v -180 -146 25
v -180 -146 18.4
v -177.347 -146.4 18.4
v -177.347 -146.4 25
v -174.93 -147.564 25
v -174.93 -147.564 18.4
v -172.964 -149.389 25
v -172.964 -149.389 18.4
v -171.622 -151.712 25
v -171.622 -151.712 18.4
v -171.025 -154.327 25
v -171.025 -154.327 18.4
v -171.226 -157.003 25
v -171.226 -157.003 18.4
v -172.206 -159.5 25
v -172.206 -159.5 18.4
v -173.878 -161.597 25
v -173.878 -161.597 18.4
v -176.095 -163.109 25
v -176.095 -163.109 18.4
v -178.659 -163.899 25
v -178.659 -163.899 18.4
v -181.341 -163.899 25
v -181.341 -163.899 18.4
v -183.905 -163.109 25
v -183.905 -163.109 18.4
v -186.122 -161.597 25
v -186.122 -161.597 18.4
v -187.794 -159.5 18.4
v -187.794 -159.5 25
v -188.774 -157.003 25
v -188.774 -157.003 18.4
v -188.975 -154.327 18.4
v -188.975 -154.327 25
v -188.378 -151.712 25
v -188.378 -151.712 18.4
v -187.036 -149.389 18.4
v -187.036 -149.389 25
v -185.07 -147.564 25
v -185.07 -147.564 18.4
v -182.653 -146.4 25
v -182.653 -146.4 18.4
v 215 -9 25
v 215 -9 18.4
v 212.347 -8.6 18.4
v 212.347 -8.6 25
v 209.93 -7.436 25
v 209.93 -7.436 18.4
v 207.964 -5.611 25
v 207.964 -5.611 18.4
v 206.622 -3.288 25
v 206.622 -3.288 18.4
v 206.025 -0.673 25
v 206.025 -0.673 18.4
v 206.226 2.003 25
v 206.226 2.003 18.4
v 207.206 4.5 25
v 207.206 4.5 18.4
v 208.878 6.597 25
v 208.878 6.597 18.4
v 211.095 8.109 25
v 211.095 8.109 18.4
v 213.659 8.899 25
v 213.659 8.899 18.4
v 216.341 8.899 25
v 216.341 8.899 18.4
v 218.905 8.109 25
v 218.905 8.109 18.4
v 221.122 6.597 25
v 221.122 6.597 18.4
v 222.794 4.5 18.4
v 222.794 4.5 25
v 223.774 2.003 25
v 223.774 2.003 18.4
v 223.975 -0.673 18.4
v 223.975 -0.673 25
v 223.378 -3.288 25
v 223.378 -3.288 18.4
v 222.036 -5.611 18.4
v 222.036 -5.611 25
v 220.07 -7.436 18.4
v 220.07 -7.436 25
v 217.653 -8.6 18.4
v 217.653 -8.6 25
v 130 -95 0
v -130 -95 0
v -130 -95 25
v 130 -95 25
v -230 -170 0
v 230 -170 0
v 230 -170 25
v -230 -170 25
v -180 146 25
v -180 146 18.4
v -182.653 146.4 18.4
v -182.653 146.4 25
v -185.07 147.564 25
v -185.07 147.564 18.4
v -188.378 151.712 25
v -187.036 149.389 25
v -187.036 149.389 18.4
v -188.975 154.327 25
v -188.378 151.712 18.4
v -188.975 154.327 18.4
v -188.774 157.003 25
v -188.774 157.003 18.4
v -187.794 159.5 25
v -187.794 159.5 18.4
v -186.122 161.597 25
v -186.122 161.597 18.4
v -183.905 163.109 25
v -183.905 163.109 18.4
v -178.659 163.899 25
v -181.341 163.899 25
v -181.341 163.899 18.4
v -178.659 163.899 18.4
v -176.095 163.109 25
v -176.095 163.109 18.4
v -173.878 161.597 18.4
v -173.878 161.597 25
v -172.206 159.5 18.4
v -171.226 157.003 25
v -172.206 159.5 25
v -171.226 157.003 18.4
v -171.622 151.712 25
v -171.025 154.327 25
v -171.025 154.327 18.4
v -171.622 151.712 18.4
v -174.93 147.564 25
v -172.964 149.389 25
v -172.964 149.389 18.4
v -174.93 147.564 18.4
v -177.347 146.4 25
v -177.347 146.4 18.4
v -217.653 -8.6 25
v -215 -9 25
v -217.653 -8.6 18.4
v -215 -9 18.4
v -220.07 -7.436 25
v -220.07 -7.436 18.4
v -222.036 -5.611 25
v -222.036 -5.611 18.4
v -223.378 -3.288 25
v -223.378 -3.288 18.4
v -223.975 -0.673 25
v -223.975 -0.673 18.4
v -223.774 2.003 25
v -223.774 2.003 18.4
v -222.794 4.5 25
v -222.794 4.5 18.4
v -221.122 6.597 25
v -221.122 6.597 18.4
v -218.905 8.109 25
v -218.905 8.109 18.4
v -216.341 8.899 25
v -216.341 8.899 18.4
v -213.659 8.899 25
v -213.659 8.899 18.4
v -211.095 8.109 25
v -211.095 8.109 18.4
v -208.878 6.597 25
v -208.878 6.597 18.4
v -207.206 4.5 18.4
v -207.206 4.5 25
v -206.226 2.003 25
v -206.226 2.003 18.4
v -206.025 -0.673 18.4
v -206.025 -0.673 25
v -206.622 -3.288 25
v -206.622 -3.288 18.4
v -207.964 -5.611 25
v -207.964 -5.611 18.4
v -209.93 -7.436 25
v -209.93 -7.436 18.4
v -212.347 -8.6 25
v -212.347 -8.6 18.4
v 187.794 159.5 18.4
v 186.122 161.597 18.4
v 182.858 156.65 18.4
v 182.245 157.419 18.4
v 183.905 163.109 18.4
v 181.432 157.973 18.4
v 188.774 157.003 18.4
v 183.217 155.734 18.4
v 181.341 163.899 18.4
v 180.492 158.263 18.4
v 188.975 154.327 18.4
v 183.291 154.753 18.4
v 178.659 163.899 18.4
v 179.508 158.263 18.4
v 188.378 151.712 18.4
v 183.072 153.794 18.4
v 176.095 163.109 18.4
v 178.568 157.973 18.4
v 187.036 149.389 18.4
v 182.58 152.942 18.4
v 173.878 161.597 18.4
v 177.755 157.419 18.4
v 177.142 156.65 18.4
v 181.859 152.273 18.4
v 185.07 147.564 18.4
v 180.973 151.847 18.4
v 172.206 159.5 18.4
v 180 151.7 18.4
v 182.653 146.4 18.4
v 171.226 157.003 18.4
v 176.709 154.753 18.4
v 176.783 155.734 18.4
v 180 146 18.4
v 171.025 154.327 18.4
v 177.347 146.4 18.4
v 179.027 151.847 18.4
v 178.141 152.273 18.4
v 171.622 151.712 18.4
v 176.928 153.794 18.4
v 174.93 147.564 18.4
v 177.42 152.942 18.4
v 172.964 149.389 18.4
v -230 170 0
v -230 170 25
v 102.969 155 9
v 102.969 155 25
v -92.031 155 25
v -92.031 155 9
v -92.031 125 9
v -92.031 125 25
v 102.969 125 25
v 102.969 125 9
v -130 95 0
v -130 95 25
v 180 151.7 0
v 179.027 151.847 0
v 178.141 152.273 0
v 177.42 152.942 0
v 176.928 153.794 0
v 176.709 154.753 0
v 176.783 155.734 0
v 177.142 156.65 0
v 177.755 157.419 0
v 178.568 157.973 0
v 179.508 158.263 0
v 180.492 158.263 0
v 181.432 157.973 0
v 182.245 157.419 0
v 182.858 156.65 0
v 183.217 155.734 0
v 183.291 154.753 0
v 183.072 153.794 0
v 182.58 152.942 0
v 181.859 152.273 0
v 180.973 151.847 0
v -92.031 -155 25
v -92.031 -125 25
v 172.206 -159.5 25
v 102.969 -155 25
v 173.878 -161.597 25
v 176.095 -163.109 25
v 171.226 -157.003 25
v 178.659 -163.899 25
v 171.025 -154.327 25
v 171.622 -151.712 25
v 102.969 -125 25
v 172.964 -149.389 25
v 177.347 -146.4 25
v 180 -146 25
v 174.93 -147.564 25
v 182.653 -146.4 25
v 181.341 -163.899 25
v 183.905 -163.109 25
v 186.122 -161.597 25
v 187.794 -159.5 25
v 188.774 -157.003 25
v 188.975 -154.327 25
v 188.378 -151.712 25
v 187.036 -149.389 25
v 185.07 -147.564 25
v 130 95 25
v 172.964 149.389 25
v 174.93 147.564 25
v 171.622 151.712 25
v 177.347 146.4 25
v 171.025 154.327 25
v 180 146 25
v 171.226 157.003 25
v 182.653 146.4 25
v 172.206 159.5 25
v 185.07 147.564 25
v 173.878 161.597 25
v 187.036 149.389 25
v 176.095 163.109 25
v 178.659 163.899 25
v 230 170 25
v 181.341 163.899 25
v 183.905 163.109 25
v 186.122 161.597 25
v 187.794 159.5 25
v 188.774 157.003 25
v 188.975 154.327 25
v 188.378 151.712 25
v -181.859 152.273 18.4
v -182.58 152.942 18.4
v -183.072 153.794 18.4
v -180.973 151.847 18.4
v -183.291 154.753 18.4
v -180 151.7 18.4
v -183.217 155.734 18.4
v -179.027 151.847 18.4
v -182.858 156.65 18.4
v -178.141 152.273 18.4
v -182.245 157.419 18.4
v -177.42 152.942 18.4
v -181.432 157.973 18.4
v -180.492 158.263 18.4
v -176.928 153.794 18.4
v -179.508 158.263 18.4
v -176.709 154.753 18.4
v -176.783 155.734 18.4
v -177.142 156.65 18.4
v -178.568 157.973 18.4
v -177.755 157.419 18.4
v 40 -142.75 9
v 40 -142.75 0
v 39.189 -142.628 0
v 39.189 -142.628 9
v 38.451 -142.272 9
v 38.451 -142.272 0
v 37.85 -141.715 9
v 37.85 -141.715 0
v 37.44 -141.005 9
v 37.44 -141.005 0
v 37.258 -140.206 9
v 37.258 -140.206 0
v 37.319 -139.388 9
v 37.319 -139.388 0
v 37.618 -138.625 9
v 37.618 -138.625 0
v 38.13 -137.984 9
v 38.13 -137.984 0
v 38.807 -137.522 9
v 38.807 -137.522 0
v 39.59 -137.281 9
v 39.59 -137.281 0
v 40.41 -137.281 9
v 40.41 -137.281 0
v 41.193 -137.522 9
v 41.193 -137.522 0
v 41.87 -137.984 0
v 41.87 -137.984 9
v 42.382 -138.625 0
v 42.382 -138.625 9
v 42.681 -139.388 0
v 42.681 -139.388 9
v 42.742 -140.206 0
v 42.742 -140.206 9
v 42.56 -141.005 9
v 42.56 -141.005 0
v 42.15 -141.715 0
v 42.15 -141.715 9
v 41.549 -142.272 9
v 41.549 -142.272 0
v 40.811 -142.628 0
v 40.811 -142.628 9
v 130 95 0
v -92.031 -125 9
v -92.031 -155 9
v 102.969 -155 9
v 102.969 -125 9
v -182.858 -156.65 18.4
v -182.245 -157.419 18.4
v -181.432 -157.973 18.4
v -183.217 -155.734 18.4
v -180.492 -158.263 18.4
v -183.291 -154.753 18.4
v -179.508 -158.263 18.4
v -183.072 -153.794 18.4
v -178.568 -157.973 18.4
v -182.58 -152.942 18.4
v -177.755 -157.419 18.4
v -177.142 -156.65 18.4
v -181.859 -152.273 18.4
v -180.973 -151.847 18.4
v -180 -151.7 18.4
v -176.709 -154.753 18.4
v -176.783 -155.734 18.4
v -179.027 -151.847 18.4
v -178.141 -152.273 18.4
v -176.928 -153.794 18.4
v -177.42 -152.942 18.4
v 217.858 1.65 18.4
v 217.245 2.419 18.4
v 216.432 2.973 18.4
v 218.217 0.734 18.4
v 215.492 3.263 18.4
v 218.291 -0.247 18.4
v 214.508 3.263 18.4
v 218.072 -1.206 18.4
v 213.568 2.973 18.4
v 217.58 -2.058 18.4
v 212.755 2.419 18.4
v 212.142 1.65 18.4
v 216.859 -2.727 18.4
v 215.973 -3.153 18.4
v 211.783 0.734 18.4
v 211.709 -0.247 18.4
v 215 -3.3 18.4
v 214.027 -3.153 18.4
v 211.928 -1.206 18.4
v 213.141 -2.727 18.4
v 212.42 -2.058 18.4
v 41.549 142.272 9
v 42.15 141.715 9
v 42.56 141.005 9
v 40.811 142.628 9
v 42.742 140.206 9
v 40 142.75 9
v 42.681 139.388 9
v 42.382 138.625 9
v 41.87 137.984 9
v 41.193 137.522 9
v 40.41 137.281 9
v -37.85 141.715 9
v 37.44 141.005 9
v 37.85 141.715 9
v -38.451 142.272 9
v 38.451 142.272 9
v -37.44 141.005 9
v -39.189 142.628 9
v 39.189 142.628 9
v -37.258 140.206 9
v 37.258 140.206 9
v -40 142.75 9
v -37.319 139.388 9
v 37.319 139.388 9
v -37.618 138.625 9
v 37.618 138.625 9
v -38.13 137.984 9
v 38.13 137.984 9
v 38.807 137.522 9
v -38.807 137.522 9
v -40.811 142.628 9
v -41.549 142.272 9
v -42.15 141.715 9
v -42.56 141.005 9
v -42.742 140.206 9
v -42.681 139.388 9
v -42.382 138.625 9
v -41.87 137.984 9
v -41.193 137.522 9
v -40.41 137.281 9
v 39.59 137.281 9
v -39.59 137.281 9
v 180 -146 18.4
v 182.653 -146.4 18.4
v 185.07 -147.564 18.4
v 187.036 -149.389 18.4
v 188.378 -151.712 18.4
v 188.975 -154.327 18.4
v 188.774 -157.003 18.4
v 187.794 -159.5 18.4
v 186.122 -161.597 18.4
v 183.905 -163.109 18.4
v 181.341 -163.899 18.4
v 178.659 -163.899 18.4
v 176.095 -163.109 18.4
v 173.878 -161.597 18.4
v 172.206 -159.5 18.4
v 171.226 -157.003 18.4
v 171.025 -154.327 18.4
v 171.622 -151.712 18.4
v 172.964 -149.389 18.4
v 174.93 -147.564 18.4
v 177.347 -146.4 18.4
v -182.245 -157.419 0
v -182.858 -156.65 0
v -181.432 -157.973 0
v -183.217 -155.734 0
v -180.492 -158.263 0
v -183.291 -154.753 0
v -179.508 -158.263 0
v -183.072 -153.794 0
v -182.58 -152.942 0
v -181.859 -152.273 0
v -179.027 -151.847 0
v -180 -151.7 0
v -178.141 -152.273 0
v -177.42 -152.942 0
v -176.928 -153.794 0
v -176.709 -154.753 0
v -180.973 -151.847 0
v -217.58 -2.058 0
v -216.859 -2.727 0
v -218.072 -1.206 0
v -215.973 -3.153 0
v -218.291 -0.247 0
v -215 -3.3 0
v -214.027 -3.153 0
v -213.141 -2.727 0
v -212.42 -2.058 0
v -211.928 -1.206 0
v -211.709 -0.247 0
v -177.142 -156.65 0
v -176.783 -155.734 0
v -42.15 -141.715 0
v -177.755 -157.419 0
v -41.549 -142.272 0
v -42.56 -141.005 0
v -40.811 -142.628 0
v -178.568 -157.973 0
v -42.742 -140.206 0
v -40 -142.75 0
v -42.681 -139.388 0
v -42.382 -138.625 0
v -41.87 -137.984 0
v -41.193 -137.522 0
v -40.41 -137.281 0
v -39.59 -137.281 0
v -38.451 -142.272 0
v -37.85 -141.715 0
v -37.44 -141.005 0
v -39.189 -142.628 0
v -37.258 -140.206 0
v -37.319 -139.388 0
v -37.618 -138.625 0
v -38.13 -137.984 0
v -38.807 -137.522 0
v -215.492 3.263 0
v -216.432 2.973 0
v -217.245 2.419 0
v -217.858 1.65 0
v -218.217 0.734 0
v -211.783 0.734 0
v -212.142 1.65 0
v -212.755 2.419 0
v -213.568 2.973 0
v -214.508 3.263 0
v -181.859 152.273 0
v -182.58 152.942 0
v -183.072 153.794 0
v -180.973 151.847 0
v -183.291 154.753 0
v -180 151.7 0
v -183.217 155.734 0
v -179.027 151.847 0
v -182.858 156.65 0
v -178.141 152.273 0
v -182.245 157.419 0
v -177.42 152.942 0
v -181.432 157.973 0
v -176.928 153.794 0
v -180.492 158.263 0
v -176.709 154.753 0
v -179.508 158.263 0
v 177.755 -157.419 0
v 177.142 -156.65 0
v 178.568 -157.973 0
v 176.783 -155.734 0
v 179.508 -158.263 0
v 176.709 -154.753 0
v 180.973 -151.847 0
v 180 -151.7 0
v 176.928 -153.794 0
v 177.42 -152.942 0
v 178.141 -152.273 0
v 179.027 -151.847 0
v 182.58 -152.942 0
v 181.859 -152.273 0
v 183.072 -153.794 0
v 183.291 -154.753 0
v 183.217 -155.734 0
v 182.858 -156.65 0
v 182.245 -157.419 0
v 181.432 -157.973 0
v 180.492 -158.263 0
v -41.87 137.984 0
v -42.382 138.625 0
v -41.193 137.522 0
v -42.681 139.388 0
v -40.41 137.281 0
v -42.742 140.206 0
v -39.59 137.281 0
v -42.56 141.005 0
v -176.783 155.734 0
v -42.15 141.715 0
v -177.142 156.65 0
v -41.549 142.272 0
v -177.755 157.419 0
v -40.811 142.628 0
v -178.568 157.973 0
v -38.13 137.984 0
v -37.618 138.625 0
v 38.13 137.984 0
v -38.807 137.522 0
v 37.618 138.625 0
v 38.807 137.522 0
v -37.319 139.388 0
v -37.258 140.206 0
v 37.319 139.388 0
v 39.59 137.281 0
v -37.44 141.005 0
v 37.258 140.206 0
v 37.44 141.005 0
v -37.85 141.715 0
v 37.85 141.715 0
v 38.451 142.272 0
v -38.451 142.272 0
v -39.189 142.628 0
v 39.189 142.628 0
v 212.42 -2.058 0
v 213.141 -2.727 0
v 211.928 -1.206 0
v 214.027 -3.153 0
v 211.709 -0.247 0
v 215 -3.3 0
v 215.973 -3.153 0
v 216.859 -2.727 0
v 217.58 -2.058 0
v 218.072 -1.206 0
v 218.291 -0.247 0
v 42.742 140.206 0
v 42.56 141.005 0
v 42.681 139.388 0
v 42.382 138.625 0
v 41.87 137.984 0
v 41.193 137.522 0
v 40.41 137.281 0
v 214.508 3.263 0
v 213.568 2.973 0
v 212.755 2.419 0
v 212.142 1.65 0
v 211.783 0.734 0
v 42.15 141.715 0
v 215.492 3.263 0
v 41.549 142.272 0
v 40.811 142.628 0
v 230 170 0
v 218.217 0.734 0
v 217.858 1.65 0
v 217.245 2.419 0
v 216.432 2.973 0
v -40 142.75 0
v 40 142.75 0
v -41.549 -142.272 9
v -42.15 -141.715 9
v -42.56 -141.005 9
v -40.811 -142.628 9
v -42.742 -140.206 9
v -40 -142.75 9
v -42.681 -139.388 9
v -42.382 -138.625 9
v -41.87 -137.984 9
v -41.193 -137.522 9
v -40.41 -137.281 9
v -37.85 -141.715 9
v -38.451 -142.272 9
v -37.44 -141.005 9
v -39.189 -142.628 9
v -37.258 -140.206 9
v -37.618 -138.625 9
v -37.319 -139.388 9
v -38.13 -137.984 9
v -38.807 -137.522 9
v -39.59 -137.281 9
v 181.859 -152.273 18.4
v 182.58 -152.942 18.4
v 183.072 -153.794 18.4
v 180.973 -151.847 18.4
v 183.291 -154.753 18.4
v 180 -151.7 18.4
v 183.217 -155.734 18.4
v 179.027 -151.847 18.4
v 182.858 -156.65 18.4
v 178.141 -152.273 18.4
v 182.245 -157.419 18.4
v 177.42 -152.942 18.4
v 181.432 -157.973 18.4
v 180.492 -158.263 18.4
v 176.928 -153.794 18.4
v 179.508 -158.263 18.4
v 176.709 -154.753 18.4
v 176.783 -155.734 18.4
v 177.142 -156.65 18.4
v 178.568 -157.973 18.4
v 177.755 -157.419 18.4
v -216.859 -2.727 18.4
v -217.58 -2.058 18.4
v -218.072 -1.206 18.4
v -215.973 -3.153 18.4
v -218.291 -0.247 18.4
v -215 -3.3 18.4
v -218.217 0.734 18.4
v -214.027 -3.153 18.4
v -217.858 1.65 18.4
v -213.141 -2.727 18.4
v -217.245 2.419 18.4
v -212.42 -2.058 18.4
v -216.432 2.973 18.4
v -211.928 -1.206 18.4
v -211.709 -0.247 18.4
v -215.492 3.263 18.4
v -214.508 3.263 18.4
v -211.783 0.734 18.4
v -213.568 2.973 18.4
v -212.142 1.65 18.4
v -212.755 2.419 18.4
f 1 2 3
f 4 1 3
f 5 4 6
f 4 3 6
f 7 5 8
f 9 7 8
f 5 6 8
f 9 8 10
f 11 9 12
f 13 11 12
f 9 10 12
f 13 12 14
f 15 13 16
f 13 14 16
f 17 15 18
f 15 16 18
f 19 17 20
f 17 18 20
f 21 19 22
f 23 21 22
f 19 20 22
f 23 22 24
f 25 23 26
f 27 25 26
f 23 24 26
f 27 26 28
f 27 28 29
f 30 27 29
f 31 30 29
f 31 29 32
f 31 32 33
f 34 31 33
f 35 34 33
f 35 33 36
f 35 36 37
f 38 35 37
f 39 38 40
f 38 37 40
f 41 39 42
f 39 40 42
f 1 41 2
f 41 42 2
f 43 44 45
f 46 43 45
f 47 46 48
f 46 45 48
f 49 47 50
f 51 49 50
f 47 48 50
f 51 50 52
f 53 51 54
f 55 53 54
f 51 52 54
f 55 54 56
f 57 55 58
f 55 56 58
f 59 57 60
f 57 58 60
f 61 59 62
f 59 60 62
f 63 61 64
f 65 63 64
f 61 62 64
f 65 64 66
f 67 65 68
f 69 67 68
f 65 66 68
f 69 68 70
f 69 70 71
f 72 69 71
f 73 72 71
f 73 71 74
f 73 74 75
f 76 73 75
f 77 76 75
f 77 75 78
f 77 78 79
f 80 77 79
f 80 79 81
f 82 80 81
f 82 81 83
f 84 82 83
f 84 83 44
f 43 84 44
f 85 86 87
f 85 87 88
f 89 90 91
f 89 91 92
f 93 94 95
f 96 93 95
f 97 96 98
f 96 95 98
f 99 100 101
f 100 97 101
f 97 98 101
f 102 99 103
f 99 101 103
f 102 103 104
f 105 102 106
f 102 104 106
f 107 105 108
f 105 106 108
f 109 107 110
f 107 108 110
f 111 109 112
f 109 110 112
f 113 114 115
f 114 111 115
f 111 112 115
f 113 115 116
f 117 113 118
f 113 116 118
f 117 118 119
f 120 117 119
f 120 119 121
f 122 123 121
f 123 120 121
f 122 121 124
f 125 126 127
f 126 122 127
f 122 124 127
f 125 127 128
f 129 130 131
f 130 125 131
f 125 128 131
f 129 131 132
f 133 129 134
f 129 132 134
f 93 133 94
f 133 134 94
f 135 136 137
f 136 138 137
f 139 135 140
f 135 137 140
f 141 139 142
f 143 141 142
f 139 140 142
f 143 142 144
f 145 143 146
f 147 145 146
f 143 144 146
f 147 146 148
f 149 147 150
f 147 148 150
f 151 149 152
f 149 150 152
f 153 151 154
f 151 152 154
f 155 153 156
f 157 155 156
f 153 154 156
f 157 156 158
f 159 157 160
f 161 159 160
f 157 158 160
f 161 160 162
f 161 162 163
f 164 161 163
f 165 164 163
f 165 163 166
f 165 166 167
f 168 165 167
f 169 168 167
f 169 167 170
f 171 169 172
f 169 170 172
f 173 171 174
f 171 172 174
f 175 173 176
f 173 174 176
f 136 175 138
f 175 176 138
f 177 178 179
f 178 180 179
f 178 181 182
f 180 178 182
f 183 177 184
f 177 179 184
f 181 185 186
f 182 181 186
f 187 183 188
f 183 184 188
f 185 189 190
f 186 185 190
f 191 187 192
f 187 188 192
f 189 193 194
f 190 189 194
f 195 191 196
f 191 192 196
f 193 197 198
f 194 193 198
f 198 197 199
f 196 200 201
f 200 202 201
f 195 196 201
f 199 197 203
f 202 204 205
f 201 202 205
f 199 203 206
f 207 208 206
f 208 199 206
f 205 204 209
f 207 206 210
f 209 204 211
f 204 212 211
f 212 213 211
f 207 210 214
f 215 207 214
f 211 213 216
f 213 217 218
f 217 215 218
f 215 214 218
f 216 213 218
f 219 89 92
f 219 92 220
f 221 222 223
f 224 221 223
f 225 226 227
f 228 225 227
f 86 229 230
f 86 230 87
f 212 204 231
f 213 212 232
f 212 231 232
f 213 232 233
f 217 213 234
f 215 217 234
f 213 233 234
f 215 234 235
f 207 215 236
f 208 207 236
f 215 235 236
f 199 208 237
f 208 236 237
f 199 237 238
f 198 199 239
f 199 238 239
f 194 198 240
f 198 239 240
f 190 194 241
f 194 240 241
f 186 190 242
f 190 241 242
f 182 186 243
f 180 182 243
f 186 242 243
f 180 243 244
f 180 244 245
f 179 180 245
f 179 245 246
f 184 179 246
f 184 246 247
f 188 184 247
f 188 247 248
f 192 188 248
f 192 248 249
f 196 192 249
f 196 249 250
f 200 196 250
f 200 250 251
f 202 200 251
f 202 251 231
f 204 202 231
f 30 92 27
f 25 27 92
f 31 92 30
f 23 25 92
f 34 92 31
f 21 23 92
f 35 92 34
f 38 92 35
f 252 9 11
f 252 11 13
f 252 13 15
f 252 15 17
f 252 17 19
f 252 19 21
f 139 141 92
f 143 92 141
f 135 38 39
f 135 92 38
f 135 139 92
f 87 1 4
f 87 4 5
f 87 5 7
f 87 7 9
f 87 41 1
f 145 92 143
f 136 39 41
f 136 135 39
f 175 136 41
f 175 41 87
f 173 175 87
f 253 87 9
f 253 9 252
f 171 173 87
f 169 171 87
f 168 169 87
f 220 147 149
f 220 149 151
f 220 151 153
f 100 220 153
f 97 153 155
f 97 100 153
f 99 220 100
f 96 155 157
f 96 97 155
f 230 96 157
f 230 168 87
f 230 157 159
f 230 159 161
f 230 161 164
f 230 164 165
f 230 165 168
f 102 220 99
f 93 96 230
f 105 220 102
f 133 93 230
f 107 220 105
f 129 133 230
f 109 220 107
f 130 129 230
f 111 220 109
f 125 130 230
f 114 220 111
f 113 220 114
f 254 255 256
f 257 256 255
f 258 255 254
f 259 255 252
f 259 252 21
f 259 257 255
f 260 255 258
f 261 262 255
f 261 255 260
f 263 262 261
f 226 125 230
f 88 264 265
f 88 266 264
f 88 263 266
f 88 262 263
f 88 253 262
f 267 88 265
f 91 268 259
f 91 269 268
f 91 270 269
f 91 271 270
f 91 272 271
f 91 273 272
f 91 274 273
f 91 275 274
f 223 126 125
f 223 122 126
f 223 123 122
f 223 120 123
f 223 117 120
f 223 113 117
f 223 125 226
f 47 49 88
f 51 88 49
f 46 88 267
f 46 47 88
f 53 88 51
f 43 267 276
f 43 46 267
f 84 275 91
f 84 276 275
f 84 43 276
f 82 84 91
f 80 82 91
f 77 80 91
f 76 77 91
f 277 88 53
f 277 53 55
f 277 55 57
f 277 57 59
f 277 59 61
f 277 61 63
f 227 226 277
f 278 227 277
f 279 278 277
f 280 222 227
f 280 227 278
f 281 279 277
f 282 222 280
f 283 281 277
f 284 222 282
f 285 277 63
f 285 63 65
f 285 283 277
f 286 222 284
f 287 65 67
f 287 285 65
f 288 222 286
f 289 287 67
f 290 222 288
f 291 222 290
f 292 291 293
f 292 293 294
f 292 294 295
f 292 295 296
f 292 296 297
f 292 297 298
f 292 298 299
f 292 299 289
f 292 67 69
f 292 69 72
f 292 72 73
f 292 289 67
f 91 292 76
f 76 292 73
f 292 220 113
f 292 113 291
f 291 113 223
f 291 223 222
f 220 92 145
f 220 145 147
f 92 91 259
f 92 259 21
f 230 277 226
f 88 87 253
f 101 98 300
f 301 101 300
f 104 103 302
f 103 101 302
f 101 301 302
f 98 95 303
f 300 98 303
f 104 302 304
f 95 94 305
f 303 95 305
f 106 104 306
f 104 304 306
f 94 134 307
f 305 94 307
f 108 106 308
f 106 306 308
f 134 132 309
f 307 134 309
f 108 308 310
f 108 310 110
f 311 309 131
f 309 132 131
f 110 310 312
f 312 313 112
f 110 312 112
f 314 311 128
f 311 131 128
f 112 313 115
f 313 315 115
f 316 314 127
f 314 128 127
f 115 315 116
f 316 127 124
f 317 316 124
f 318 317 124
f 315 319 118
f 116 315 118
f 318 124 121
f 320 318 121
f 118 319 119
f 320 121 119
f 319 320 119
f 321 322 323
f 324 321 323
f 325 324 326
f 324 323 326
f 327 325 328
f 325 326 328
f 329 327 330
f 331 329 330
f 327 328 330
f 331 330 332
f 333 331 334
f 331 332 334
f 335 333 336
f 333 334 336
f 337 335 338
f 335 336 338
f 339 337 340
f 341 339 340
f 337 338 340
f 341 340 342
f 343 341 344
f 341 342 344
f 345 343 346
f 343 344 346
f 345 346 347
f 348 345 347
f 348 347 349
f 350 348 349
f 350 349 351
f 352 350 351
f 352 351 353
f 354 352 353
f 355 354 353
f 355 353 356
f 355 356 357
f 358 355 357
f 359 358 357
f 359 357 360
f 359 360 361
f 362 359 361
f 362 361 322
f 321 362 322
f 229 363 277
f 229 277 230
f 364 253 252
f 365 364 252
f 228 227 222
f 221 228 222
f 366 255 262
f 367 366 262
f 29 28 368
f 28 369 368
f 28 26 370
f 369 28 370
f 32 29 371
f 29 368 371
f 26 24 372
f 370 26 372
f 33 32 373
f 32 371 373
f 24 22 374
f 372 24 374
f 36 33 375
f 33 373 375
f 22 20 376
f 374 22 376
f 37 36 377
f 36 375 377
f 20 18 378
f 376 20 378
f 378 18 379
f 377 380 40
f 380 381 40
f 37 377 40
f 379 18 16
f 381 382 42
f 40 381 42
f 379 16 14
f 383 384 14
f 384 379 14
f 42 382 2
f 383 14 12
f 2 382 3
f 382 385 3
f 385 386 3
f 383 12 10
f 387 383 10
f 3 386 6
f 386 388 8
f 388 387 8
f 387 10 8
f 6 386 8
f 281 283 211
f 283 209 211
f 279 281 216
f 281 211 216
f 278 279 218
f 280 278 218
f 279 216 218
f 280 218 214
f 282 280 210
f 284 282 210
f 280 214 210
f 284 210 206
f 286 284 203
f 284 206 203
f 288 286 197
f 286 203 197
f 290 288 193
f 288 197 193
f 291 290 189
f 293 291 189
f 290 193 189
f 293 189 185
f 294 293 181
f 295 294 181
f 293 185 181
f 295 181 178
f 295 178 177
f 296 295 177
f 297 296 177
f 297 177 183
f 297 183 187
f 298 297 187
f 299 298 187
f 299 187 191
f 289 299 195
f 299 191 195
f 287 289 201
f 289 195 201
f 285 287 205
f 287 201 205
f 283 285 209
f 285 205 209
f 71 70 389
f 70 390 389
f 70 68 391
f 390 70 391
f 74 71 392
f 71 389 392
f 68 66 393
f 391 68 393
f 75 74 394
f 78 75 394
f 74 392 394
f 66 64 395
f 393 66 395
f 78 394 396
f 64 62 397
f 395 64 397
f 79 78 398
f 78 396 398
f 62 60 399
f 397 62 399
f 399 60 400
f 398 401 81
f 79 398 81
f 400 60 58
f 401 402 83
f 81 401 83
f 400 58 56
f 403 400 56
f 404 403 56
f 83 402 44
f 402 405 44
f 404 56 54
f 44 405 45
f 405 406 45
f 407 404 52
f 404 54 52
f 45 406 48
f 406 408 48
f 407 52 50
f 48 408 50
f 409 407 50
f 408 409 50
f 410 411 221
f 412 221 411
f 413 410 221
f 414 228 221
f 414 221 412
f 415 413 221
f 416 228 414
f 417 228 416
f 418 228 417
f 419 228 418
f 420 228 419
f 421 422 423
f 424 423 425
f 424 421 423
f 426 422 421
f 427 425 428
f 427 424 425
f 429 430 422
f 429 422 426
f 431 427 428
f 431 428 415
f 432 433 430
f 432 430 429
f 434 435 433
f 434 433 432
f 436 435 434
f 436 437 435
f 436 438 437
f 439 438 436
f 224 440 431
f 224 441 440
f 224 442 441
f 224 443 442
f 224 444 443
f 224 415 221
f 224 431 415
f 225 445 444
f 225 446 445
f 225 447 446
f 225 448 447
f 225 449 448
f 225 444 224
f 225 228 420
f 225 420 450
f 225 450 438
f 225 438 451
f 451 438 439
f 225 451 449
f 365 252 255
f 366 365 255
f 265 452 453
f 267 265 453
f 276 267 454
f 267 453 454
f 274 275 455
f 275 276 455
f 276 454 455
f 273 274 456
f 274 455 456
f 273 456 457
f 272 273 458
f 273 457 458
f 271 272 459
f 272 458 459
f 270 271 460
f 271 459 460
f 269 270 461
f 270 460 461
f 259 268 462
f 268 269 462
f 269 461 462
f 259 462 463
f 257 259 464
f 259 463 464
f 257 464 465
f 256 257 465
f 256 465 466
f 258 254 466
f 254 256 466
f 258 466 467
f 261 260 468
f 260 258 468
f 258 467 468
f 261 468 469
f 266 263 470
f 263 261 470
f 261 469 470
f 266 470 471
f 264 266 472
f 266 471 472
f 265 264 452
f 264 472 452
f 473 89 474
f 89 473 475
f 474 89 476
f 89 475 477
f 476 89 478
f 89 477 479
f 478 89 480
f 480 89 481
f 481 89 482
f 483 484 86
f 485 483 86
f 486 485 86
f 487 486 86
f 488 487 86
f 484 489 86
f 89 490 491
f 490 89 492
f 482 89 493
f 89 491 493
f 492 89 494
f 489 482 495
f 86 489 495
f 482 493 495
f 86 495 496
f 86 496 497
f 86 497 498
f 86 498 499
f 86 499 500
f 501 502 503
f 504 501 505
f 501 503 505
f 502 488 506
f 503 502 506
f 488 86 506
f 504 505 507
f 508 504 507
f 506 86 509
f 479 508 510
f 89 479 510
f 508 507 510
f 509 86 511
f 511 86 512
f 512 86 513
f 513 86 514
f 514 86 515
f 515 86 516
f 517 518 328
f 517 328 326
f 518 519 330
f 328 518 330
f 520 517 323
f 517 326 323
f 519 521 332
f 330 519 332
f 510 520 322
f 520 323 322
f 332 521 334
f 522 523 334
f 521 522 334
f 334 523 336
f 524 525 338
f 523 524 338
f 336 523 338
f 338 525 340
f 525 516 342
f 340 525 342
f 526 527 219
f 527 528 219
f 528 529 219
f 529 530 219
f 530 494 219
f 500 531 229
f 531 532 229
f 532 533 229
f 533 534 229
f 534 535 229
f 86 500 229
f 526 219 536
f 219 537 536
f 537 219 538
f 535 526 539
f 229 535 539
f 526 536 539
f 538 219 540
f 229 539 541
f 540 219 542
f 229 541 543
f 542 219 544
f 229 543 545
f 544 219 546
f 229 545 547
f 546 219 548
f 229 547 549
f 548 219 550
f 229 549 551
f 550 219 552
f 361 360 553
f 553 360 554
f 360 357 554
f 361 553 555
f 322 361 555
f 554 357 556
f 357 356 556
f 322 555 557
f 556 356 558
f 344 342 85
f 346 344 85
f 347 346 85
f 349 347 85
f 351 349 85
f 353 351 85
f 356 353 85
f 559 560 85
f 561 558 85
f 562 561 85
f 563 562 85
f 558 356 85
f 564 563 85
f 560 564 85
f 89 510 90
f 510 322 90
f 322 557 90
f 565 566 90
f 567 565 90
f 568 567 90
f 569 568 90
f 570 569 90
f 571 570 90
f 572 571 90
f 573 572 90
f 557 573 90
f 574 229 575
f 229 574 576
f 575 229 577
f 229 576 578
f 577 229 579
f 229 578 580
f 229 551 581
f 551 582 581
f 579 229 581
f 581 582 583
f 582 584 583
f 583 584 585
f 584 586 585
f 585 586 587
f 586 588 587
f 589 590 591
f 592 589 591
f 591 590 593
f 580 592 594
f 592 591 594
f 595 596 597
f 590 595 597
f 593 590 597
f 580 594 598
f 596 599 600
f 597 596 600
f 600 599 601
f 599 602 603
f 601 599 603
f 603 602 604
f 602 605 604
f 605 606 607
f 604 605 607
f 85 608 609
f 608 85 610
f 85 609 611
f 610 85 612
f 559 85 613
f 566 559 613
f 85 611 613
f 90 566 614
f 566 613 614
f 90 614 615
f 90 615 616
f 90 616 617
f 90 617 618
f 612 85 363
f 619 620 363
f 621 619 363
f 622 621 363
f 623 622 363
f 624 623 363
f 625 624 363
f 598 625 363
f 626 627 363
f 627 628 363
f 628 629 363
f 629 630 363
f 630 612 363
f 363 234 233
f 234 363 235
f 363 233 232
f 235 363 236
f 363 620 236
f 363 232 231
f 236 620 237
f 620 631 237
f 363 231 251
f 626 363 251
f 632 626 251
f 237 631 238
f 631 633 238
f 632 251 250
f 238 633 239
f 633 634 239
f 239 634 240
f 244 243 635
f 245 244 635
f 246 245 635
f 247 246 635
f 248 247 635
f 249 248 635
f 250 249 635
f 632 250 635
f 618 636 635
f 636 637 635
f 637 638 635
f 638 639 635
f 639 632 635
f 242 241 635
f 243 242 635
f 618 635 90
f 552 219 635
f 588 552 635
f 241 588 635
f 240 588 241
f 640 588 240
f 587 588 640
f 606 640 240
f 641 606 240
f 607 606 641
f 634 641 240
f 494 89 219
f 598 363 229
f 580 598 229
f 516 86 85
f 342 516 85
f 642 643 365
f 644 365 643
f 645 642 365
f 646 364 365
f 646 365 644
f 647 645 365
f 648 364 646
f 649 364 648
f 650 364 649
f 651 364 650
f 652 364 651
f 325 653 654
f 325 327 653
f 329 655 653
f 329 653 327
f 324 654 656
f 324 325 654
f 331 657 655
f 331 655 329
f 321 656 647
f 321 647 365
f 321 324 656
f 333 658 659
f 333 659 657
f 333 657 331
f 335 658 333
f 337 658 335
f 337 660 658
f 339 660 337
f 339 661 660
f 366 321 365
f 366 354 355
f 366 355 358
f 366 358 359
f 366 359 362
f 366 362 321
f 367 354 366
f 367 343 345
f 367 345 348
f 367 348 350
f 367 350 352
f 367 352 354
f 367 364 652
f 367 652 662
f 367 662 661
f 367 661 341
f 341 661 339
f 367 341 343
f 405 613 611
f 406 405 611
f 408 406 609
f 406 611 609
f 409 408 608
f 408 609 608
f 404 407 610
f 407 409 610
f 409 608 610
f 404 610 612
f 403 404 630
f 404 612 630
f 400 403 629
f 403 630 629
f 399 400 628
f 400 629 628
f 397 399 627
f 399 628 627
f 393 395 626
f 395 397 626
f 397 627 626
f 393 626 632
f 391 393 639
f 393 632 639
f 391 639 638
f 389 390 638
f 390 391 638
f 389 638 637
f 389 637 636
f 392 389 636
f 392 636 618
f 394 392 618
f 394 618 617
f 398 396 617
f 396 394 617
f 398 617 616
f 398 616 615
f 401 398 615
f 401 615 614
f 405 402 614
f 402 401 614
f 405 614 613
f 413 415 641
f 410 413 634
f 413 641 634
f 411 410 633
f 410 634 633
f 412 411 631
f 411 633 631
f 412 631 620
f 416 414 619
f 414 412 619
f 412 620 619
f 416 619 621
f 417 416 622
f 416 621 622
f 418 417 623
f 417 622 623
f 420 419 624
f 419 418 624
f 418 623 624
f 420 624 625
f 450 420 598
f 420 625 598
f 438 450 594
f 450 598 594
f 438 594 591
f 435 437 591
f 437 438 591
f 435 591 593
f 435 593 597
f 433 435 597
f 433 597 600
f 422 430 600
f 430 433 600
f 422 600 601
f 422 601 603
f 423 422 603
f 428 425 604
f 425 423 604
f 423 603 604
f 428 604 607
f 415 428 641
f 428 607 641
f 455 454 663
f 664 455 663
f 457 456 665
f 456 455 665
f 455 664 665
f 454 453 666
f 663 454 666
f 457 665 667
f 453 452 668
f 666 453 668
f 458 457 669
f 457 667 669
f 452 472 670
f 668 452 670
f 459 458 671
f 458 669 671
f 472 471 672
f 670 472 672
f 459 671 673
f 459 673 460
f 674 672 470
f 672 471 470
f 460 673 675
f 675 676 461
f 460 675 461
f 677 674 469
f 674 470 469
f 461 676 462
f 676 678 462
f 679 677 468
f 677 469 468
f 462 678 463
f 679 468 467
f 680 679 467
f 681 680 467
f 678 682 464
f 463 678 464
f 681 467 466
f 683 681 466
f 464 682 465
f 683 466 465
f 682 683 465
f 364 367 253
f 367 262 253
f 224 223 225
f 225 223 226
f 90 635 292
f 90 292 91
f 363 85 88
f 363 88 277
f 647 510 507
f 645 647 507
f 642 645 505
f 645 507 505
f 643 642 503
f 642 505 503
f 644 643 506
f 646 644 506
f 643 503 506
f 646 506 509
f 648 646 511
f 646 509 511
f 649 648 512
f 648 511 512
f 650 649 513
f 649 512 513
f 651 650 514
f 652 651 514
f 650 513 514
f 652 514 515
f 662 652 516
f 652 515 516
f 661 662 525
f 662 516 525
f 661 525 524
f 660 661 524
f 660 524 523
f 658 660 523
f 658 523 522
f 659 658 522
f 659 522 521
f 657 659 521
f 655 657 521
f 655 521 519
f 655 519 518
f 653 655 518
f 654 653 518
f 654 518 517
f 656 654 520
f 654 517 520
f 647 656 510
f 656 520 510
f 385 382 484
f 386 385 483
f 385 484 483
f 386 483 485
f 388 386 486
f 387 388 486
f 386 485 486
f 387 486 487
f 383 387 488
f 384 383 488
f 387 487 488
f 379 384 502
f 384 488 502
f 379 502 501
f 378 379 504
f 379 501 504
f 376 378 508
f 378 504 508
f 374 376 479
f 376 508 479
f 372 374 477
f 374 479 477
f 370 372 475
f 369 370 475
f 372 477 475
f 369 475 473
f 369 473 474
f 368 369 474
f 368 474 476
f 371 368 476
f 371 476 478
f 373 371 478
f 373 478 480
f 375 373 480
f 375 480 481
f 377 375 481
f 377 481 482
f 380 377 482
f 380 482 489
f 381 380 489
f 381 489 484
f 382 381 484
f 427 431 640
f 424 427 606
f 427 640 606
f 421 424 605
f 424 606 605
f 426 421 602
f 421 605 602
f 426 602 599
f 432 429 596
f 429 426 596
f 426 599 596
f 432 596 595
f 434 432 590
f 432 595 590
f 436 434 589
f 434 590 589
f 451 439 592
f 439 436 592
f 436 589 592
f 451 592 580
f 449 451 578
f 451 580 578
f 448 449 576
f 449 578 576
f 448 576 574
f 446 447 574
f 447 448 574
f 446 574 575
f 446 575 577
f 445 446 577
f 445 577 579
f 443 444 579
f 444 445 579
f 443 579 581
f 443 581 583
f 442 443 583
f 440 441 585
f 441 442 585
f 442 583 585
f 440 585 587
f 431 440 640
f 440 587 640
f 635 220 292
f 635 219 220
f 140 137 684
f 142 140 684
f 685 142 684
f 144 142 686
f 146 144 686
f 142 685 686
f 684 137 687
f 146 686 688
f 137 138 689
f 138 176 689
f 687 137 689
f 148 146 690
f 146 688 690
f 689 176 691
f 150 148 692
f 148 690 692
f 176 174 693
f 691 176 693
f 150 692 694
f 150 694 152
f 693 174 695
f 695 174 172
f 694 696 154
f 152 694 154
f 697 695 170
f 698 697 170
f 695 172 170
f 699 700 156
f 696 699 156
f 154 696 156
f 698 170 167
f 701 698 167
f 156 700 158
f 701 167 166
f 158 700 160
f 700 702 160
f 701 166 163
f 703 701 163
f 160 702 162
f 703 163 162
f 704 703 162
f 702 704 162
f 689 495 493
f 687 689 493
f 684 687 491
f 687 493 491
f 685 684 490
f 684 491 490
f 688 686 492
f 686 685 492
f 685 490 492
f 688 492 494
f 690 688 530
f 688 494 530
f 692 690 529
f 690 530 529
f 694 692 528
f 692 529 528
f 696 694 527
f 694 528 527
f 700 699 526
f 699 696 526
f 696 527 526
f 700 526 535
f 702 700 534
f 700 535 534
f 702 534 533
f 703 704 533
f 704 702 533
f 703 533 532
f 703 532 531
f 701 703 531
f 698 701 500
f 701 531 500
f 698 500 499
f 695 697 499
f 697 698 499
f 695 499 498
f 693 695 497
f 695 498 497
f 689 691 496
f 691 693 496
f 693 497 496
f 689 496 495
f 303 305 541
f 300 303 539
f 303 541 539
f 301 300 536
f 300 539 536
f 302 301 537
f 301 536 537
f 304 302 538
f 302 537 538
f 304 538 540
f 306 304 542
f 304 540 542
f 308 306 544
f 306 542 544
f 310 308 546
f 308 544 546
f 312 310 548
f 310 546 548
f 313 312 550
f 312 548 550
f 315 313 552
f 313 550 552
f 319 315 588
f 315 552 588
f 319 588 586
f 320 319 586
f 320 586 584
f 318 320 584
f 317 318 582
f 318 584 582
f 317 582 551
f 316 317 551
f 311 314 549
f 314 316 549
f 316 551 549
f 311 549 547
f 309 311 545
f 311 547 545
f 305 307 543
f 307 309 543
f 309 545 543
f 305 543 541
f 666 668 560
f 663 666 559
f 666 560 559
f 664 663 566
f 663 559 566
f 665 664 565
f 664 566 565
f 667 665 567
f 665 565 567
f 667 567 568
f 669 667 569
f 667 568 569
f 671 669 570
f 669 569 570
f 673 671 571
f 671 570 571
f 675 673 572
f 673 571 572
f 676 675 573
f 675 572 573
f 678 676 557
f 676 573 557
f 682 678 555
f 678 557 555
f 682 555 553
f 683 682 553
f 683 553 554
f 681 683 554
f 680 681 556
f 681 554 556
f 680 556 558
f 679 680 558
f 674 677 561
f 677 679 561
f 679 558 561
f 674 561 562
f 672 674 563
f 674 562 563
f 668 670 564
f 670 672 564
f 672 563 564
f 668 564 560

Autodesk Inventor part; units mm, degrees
ref_plane "YZ Plane" through (0, 0, 0) normal (1, 0, 0) x (0, 1, 0)
ref_plane "XZ Plane" through (0, 0, 0) normal (0, 1, 0) x (-1, 0, 0)
ref_plane "XY Plane" through (0, 0, 0) normal (0, 0, 1) x (1, 0, 0)
sketch "Sketch1" plane through (0, 0, 0) normal (0, 0, 1) x (1, 0, 0)
  line L0 (-230, 170) -> (230, 170)
  line L1 (230, 170) -> (230, -170)
  line L2 (230, -170) -> (-230, -170)
  line L3 (-230, -170) -> (-230, 170)
  line L4 (130, 170) -> (230, 170)
  line L5 (230, 170) -> (230, -170)
  line L6 (230, -170) -> (130, -170)
  line L7 (130, -170) -> (130, 170)
  line L8 (-230, 170) -> (-130, 170)
  line L9 (-130, 170) -> (-130, -170)
  line L10 (-130, -170) -> (-230, -170)
  line L11 (-230, -170) -> (-230, 170)
  line L12 (-230, 170) -> (230, 170)
  line L13 (230, 170) -> (230, 95)
  line L14 (230, 95) -> (-230, 95)
  line L15 (-230, 95) -> (-230, 170)
  line L16 (-230, -95) -> (230, -95)
  line L17 (230, -95) -> (230, -170)
  line L18 (230, -170) -> (-230, -170)
  line L19 (-230, -170) -> (-230, -95)
  point P0 (0, 0)
  dimension "d0" = 460
  dimension "d1" = 340
  dimension "d2" = 170
  dimension "d3" = 230
  dimension "d4" = 100
  dimension "d5" = 100
  dimension "d6" = 75
  dimension "d7" = 75
extrude "Extrusion1" add sketch "Sketch1" along normal blind 25 contours L0 L9 L14 L3 | L0 L7 L14 L9 | L14 L9 L16 L3 | L0 L1 L14 L7 | L16 L9 L2 L3 | L14 L1 L16 L7 | L16 L7 L2 L9 | L16 L1 L2 L7
sketch "Sketch2" plane through (0, 0, 25) normal (0, 0, 1) x (1, 0, 0)
  line L0 (-92.0312, -155) -> (102.9688, -155)
  line L1 (102.9688, -155) -> (102.9688, -125)
  line L2 (102.9688, -125) -> (-92.0313, -125)
  line L3 (-92.0313, -125) -> (-92.0312, -155)
  line L4 (-230, -170) -> (230, -170) projected
  point P0 (0, 0)
  dimension "d10" = 30
  dimension "d11" = 195
  dimension "d12" = 15
extrude "Extrusion2" cut sketch "Sketch2" against normal blind 16
sketch "Sketch3" plane through (0, 0, 9) normal (0, 0, 1) x (1, 0, 0)
  line L0 (102.9688, -155) -> (-92.0312, -155) projected
  point P0 (0, 0)
  point P1 (-40, -140)
  point P2 (40, -140)
  dimension "d15" = 15
  dimension "d16" = 80
  dimension "d17" = 40
hole "Hole1" at (-40, -140, 9) at (40, -140, 9) direction (0, 0, -1) diameter 5.5 end through all
mirror "Mirror2" about plane through (0, 0, 0) normal (0, 1, 0) of "Extrusion2", "Hole1"
sketch "Sketch4" plane through (0, 0, 25) normal (0, 0, 1) x (1, 0, 0)
  line L0 (230, -170) -> (230, 170) projected
  line L1 (230, 170) -> (-230, 170) projected
  point P0 (0, 0)
  point P1 (180, 155)
  point P2 (215, 0)
  dimension "d25" = 15
  dimension "d26" = 15
  dimension "d27" = 50
hole "Hole2" at (180, 155, 25) at (215, 0, 25) direction (0, 0, -1) diameter 6.6 end through all counterbore diameter 18 counterbore depth 6.6 clearance for "Hex Head Cap Screw ISO 24017" size "M6" standard "ISO"
mirror "Mirror3" about plane through (0, 0, 0) normal (0, 1, 0) of "Hole2"
mirror "Mirror4" about plane through (0, 0, 0) normal (1, 0, 0) of "Hole2", "Mirror3"
equation "\"d2\" = 0.5 * d1"
equation "\"d3\" = 0.5 * d0"
equation "\"d17\" = 0.5 * d16"
properties part number "modified_xyStageMount"
